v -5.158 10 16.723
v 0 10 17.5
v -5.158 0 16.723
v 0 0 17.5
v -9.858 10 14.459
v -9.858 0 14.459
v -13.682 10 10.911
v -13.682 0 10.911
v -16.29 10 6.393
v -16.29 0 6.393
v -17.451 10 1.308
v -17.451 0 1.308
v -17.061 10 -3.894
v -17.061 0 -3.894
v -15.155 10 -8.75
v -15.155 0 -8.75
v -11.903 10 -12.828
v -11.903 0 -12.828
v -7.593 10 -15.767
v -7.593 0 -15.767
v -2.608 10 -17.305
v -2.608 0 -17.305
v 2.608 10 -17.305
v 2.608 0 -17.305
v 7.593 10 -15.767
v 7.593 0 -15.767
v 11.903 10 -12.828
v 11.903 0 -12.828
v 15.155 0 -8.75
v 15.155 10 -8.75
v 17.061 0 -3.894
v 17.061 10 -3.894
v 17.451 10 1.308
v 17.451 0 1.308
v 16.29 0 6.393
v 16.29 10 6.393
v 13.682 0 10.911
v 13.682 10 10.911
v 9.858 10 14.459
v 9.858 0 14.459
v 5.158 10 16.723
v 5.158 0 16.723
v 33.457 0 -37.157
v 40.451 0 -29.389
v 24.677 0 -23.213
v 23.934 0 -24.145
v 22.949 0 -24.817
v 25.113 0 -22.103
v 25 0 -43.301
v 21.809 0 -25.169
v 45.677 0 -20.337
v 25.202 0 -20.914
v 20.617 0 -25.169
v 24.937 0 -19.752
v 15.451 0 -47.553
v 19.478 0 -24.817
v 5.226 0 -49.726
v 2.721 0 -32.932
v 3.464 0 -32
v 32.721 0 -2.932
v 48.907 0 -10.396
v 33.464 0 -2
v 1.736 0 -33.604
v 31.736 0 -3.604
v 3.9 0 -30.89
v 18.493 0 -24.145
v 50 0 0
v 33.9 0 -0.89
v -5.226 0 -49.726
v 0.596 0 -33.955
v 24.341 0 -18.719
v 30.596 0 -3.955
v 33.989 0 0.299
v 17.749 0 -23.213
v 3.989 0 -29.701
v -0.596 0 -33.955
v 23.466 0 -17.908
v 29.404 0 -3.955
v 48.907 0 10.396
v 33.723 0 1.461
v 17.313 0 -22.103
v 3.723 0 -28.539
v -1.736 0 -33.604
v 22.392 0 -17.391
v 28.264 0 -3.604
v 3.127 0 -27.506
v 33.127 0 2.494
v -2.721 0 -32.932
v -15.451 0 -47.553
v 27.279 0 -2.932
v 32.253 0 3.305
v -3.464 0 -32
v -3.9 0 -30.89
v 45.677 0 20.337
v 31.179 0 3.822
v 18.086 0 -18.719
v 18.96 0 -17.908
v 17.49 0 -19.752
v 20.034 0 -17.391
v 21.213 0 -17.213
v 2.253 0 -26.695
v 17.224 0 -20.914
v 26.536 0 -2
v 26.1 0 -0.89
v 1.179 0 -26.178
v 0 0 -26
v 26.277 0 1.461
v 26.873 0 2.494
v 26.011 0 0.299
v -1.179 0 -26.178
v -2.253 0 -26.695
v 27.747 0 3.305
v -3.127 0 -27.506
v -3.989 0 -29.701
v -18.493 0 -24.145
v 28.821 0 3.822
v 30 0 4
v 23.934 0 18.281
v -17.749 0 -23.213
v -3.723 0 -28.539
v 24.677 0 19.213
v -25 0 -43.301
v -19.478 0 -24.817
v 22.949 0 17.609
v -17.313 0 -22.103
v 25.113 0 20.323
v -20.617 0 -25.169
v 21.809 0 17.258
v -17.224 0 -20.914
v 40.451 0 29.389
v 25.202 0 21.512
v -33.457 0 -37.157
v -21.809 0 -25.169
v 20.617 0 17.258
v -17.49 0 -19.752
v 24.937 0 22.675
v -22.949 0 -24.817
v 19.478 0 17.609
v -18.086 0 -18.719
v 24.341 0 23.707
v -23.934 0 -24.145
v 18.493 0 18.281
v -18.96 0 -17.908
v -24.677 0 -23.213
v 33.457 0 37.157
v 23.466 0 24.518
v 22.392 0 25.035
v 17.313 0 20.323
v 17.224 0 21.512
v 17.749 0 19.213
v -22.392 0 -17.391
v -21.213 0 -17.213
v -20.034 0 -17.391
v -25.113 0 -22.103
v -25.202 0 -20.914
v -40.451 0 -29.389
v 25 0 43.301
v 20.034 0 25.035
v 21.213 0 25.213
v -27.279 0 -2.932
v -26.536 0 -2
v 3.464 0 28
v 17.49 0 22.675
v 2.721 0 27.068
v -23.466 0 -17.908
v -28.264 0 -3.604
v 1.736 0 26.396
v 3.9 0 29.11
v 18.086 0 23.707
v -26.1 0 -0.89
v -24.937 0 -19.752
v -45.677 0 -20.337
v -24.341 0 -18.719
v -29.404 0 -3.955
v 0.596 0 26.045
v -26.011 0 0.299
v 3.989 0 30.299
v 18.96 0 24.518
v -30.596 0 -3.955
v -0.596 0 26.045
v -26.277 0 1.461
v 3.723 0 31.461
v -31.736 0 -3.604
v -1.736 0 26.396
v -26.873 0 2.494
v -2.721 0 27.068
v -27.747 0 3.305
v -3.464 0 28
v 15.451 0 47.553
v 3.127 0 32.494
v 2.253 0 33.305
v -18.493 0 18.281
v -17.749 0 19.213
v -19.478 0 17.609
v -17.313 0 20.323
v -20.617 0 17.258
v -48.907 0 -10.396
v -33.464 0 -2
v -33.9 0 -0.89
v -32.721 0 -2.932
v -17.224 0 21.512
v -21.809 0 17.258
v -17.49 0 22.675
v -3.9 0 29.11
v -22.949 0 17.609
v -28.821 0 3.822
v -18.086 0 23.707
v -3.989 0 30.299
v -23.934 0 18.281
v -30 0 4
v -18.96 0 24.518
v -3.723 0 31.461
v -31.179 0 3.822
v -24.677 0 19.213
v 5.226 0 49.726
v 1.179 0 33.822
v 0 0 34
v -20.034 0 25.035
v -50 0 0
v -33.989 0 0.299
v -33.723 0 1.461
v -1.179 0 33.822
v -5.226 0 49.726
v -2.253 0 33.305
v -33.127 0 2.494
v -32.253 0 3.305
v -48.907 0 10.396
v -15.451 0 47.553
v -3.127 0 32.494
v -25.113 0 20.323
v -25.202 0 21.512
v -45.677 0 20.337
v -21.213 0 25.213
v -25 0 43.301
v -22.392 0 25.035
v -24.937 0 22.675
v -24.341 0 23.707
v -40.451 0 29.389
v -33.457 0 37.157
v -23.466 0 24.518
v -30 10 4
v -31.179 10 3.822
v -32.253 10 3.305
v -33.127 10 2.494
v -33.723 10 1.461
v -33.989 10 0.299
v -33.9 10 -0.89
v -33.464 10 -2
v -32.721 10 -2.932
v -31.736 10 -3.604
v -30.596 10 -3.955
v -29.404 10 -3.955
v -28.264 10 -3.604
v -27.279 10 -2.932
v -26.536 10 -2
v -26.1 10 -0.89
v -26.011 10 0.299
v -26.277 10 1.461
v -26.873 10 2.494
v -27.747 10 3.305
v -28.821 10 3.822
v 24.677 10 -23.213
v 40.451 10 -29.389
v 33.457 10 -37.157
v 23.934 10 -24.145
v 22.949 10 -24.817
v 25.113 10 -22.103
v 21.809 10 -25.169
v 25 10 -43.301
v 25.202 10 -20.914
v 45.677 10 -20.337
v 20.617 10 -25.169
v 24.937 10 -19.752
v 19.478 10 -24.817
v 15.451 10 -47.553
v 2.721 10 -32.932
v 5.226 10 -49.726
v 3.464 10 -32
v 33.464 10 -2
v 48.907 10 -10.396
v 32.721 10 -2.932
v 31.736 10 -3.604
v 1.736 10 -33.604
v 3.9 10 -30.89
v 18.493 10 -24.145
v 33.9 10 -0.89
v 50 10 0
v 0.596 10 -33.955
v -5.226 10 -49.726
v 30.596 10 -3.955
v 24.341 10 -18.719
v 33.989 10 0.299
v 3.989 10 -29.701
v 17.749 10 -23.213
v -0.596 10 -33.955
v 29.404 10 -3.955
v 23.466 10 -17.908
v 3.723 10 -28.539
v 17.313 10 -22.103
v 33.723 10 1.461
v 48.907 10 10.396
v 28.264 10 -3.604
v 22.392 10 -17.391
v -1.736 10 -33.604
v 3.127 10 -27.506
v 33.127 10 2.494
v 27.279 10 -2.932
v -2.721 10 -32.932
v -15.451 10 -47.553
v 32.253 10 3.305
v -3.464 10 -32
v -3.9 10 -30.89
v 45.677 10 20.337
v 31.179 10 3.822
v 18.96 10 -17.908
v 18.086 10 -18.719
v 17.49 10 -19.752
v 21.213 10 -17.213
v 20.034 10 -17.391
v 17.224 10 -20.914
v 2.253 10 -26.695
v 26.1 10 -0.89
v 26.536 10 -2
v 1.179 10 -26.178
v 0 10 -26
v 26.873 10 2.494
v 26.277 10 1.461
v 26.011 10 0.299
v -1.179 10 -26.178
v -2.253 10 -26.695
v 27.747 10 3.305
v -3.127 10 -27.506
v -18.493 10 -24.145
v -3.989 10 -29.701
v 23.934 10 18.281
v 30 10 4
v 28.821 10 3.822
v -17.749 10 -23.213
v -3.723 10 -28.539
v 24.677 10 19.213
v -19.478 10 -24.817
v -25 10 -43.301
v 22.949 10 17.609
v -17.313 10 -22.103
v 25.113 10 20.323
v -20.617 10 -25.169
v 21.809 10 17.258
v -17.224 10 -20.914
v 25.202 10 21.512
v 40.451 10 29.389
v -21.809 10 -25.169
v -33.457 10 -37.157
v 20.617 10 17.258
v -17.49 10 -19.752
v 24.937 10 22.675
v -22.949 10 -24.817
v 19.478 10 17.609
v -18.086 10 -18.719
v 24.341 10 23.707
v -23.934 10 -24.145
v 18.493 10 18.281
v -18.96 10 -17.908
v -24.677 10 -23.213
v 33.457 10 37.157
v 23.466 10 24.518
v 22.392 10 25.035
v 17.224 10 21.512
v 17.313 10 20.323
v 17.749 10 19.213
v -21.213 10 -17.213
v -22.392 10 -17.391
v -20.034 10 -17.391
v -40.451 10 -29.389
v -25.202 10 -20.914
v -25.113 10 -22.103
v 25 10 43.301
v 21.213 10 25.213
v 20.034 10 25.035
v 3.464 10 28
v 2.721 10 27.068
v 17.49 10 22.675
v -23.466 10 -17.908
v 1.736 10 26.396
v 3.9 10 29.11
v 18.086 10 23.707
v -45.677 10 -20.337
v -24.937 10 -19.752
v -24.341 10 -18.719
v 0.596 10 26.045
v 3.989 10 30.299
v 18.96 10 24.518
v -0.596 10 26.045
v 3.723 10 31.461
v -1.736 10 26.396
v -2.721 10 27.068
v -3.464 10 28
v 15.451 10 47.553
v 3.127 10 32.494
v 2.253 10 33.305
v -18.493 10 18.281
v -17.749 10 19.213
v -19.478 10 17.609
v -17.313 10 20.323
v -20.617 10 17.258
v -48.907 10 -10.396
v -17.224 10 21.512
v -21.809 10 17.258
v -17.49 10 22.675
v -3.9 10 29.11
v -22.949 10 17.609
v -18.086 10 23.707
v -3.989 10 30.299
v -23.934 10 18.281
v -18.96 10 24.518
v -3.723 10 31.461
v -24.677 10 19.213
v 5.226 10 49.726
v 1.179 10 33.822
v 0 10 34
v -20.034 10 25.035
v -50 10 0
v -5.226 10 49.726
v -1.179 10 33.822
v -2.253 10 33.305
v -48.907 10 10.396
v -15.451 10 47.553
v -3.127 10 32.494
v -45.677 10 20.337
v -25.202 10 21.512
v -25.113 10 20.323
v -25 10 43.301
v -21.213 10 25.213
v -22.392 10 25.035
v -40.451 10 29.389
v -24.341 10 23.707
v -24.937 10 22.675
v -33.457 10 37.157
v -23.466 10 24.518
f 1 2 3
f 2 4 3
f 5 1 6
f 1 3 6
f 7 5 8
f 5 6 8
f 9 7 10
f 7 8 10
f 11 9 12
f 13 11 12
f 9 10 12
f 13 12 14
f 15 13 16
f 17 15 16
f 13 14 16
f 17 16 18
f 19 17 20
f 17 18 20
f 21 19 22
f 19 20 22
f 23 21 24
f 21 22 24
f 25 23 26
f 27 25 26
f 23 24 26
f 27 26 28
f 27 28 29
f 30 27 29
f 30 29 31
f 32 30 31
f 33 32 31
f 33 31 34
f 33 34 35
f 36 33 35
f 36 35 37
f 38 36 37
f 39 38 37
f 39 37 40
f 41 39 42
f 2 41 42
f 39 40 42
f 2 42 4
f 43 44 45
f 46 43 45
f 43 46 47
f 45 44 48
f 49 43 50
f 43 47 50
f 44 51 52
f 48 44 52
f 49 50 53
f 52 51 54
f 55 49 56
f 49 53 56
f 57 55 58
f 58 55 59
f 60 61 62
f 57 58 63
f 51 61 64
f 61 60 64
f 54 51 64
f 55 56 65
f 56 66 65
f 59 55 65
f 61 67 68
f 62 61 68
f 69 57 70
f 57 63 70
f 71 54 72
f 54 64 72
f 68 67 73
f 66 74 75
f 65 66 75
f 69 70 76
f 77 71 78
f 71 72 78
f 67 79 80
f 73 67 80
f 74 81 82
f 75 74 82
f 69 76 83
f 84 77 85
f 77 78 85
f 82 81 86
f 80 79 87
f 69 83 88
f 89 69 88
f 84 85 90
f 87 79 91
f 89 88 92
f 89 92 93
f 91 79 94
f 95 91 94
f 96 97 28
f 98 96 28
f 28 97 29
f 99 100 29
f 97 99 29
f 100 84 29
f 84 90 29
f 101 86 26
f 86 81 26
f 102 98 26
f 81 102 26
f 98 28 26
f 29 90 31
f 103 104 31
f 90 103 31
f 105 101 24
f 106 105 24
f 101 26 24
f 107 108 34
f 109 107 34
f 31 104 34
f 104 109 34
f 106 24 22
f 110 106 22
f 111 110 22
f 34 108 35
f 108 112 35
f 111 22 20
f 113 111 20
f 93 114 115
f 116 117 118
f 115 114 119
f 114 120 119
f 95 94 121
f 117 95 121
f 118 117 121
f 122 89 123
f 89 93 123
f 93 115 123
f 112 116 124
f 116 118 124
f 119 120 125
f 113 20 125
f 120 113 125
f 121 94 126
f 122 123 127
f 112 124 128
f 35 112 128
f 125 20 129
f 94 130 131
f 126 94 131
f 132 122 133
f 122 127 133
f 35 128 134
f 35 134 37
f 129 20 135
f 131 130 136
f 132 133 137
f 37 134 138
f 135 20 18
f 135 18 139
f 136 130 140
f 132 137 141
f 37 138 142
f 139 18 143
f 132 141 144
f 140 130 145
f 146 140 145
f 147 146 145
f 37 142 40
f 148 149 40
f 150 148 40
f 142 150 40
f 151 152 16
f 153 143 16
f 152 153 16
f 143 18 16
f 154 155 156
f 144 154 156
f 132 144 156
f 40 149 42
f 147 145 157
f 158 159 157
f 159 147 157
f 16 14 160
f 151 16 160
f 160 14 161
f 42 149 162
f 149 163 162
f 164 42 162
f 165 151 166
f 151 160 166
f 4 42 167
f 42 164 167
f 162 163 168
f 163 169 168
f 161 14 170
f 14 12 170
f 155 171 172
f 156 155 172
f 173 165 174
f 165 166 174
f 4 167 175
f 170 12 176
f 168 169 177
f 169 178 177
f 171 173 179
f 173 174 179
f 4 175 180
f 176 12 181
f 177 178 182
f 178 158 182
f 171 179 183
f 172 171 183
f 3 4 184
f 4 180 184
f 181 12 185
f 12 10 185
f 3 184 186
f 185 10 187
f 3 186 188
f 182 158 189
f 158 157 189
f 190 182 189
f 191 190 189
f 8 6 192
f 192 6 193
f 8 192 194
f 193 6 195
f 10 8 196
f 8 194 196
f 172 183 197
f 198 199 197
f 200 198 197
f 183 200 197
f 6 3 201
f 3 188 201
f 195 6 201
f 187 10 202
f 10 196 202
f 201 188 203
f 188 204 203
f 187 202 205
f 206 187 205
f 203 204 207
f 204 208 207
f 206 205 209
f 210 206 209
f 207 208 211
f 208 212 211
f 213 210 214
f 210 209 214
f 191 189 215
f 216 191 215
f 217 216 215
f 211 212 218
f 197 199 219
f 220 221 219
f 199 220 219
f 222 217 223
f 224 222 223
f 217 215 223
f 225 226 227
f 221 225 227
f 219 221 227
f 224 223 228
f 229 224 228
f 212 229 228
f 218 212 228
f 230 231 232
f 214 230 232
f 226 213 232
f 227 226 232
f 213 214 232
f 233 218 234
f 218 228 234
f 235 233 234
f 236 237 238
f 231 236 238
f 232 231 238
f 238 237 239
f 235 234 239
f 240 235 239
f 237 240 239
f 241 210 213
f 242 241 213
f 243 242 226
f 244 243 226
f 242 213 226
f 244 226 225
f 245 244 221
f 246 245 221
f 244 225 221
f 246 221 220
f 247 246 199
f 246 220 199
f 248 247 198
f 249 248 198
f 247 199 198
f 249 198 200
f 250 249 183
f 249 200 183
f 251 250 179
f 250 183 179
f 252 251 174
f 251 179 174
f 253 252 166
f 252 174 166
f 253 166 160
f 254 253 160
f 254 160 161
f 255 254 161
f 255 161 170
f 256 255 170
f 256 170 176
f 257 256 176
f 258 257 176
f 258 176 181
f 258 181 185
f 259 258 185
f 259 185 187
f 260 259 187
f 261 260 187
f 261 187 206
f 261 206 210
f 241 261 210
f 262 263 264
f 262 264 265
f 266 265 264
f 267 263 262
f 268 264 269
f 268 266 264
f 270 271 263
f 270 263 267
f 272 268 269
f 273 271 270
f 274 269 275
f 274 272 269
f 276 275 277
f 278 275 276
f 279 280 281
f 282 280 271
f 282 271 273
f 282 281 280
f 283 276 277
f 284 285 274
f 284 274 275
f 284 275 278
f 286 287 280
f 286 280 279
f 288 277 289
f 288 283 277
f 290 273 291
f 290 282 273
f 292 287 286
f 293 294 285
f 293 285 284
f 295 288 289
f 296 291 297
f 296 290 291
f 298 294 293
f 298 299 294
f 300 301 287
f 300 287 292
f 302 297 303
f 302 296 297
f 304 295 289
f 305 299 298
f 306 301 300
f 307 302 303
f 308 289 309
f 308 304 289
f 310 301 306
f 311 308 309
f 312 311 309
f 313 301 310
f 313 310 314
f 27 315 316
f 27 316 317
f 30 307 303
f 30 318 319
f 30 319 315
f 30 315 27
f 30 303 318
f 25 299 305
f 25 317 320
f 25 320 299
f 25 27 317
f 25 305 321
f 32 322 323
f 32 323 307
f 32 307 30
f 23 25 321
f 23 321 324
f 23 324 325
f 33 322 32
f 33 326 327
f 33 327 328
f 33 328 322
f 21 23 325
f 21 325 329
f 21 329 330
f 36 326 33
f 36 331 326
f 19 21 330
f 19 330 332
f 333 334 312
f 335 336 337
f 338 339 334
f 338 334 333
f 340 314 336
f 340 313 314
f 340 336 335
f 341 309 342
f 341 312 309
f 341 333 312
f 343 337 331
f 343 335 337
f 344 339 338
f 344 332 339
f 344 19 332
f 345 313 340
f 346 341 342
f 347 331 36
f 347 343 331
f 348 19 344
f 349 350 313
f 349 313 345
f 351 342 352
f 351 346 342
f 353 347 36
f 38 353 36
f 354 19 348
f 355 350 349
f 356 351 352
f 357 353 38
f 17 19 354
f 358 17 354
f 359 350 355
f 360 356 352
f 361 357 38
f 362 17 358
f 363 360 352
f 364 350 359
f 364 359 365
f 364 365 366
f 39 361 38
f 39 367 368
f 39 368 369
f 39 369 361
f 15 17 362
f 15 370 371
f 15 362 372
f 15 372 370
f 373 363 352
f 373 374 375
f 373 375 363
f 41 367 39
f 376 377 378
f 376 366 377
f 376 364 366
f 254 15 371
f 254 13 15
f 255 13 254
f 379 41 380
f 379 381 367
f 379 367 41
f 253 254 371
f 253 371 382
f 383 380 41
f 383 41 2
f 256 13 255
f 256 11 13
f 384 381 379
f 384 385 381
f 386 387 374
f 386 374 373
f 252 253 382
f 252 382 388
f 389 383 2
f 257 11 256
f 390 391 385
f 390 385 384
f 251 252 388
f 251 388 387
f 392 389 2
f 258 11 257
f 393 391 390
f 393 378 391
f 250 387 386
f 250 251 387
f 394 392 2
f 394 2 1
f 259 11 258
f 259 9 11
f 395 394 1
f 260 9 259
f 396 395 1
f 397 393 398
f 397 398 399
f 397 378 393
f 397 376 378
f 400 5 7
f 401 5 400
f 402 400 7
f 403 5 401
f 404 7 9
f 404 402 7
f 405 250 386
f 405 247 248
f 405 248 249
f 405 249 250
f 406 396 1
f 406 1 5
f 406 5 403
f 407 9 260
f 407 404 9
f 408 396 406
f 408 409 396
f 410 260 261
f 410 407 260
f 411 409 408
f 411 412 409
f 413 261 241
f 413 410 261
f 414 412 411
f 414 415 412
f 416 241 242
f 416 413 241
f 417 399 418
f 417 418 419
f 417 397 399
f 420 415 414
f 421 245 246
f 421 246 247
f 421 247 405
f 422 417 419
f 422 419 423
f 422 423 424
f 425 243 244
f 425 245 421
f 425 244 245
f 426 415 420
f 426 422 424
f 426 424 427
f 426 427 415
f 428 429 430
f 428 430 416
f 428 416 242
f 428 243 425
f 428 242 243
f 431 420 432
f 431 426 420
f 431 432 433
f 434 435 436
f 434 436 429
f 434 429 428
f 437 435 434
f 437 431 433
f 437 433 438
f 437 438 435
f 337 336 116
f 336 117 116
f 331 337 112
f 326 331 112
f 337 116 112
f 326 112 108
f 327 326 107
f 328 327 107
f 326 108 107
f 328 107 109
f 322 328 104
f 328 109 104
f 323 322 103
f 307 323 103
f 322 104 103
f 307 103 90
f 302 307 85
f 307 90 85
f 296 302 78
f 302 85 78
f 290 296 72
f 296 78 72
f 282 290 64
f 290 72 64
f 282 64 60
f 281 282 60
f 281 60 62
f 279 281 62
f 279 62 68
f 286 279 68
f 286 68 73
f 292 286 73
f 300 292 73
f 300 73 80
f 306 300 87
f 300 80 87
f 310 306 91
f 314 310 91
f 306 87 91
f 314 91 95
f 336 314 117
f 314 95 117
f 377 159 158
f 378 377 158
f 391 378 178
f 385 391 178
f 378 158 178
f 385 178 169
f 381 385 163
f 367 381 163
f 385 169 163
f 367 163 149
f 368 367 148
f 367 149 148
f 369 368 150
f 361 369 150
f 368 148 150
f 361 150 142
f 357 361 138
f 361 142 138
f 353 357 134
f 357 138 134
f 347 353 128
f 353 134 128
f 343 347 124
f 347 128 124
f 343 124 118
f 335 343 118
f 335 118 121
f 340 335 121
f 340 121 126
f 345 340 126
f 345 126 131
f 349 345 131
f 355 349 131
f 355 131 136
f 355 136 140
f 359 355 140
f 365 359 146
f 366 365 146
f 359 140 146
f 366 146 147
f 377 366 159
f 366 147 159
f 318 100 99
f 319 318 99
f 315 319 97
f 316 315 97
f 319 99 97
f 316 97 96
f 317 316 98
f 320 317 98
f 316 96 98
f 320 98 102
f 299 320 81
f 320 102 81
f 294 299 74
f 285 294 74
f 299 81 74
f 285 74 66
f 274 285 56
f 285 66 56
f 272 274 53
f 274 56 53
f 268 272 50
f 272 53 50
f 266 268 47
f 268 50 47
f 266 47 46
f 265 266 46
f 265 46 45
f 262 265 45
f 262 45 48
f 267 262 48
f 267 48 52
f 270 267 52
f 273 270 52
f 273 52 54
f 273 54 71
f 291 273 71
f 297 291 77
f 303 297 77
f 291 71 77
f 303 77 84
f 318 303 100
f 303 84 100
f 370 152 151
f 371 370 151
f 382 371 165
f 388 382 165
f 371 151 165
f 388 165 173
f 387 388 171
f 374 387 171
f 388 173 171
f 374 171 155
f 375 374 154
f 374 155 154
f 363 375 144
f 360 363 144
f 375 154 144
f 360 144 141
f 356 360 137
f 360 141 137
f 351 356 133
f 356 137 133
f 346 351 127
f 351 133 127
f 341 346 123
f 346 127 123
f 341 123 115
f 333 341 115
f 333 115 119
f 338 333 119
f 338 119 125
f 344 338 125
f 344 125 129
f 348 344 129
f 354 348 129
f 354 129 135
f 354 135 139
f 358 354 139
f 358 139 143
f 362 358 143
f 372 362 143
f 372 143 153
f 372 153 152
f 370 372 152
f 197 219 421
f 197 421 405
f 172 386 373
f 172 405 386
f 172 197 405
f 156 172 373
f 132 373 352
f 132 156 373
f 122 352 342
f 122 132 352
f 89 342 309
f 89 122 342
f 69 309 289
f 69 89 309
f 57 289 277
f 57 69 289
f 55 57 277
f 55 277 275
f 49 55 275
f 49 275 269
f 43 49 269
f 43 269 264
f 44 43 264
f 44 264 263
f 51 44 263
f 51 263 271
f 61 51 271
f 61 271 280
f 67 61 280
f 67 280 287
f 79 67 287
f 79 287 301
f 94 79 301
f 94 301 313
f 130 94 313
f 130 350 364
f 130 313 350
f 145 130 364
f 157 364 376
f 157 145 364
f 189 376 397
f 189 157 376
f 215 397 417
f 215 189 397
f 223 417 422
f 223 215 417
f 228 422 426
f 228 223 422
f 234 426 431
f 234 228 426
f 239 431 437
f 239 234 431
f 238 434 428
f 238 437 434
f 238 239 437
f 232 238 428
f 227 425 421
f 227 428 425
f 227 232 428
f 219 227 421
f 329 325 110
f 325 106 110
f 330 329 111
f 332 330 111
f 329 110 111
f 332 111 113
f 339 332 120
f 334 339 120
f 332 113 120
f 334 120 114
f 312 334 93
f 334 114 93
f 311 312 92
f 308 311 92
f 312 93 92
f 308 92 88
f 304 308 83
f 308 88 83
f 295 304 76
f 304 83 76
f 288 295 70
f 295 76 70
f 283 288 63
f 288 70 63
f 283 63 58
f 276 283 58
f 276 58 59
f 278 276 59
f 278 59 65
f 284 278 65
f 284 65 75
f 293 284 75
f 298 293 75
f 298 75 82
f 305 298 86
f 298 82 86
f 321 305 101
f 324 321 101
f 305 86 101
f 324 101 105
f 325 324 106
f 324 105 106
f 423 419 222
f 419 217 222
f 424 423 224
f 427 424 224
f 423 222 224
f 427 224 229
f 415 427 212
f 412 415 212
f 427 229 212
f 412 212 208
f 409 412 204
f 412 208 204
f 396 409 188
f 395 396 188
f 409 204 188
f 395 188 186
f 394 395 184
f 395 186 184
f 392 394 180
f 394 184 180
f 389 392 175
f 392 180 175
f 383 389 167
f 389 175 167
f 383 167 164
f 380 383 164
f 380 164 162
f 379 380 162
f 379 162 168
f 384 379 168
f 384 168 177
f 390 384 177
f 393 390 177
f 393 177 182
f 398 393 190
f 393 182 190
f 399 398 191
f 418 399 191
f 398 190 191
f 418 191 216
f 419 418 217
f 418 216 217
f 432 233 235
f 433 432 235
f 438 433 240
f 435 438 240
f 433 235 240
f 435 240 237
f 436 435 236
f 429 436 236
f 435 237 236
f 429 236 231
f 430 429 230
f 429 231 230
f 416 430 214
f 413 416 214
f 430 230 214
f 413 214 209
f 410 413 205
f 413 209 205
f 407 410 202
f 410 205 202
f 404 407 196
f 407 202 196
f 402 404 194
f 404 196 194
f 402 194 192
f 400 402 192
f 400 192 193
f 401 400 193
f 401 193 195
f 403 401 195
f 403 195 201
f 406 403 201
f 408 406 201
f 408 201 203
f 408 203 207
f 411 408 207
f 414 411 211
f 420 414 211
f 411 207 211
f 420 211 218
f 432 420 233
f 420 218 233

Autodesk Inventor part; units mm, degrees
ref_plane "YZ Plane" through (0, 0, 0) normal (1, 0, 0) x (0, 1, 0)
ref_plane "XZ Plane" through (0, 0, 0) normal (0, 1, 0) x (-1, 0, 0)
ref_plane "XY Plane" through (0, 0, 0) normal (0, 0, 1) x (1, 0, 0)
sketch "Sketch1" plane through (0, 0, 0) normal (0, 1, 0) x (-1, 0, 0)
  circle A0 centre (0, 0) radius 50
  dimension "d1" = 100
extrude "Extrusion1" add sketch "Sketch1" along normal blind 10
sketch "Sketch2" plane through (0, 10, 0) normal (0, 1, 0) x (1, 0, 0)
  circle A0 centre (0, 0) radius 16
  dimension "d4" = 32
hole "Hole1" at (0, 10, 0) direction (0, -1, 0) diameter 35 end through all
sketch "Sketch3" plane through (0, 10, 0) normal (0, 1, 0) x (1, 0, 0)
  circle A0 centre (0, 30) radius 4
  circle A1 centre (-21.2132, 21.2132) radius 4
  circle A2 centre (-30, 0) radius 4
  circle A3 centre (-21.2132, -21.2132) radius 4
  circle A4 centre (0, -30) radius 4
  circle A5 centre (21.2132, -21.2132) radius 4
  circle A6 centre (30, 0) radius 4
  circle A7 centre (21.2132, 21.2132) radius 4
  point P0 (0, 0)
  point P1 (0, 0)
  dimension "d12" = 8
  dimension "d13" = 30
  dimension "d16" = 360
hole "Hole2" at (-21.2132, 10, 21.2132) at (-30, 10, 0) at (-21.2132, 10, -21.2132) at (0, 10, -30) at (21.2132, 10, -21.2132) at (30, 10, 0) at (21.2132, 10, 21.2132) at (0, 10, 30) direction (0, -1, 0) diameter 8 end through all
sketch "Sketch4" plane through (0, 10, 0) normal (0, 1, 0) x (1, 0, 0)
  point P0 (0, 0)
properties part number "Orifice Plate" material "Aluminum 6061"
